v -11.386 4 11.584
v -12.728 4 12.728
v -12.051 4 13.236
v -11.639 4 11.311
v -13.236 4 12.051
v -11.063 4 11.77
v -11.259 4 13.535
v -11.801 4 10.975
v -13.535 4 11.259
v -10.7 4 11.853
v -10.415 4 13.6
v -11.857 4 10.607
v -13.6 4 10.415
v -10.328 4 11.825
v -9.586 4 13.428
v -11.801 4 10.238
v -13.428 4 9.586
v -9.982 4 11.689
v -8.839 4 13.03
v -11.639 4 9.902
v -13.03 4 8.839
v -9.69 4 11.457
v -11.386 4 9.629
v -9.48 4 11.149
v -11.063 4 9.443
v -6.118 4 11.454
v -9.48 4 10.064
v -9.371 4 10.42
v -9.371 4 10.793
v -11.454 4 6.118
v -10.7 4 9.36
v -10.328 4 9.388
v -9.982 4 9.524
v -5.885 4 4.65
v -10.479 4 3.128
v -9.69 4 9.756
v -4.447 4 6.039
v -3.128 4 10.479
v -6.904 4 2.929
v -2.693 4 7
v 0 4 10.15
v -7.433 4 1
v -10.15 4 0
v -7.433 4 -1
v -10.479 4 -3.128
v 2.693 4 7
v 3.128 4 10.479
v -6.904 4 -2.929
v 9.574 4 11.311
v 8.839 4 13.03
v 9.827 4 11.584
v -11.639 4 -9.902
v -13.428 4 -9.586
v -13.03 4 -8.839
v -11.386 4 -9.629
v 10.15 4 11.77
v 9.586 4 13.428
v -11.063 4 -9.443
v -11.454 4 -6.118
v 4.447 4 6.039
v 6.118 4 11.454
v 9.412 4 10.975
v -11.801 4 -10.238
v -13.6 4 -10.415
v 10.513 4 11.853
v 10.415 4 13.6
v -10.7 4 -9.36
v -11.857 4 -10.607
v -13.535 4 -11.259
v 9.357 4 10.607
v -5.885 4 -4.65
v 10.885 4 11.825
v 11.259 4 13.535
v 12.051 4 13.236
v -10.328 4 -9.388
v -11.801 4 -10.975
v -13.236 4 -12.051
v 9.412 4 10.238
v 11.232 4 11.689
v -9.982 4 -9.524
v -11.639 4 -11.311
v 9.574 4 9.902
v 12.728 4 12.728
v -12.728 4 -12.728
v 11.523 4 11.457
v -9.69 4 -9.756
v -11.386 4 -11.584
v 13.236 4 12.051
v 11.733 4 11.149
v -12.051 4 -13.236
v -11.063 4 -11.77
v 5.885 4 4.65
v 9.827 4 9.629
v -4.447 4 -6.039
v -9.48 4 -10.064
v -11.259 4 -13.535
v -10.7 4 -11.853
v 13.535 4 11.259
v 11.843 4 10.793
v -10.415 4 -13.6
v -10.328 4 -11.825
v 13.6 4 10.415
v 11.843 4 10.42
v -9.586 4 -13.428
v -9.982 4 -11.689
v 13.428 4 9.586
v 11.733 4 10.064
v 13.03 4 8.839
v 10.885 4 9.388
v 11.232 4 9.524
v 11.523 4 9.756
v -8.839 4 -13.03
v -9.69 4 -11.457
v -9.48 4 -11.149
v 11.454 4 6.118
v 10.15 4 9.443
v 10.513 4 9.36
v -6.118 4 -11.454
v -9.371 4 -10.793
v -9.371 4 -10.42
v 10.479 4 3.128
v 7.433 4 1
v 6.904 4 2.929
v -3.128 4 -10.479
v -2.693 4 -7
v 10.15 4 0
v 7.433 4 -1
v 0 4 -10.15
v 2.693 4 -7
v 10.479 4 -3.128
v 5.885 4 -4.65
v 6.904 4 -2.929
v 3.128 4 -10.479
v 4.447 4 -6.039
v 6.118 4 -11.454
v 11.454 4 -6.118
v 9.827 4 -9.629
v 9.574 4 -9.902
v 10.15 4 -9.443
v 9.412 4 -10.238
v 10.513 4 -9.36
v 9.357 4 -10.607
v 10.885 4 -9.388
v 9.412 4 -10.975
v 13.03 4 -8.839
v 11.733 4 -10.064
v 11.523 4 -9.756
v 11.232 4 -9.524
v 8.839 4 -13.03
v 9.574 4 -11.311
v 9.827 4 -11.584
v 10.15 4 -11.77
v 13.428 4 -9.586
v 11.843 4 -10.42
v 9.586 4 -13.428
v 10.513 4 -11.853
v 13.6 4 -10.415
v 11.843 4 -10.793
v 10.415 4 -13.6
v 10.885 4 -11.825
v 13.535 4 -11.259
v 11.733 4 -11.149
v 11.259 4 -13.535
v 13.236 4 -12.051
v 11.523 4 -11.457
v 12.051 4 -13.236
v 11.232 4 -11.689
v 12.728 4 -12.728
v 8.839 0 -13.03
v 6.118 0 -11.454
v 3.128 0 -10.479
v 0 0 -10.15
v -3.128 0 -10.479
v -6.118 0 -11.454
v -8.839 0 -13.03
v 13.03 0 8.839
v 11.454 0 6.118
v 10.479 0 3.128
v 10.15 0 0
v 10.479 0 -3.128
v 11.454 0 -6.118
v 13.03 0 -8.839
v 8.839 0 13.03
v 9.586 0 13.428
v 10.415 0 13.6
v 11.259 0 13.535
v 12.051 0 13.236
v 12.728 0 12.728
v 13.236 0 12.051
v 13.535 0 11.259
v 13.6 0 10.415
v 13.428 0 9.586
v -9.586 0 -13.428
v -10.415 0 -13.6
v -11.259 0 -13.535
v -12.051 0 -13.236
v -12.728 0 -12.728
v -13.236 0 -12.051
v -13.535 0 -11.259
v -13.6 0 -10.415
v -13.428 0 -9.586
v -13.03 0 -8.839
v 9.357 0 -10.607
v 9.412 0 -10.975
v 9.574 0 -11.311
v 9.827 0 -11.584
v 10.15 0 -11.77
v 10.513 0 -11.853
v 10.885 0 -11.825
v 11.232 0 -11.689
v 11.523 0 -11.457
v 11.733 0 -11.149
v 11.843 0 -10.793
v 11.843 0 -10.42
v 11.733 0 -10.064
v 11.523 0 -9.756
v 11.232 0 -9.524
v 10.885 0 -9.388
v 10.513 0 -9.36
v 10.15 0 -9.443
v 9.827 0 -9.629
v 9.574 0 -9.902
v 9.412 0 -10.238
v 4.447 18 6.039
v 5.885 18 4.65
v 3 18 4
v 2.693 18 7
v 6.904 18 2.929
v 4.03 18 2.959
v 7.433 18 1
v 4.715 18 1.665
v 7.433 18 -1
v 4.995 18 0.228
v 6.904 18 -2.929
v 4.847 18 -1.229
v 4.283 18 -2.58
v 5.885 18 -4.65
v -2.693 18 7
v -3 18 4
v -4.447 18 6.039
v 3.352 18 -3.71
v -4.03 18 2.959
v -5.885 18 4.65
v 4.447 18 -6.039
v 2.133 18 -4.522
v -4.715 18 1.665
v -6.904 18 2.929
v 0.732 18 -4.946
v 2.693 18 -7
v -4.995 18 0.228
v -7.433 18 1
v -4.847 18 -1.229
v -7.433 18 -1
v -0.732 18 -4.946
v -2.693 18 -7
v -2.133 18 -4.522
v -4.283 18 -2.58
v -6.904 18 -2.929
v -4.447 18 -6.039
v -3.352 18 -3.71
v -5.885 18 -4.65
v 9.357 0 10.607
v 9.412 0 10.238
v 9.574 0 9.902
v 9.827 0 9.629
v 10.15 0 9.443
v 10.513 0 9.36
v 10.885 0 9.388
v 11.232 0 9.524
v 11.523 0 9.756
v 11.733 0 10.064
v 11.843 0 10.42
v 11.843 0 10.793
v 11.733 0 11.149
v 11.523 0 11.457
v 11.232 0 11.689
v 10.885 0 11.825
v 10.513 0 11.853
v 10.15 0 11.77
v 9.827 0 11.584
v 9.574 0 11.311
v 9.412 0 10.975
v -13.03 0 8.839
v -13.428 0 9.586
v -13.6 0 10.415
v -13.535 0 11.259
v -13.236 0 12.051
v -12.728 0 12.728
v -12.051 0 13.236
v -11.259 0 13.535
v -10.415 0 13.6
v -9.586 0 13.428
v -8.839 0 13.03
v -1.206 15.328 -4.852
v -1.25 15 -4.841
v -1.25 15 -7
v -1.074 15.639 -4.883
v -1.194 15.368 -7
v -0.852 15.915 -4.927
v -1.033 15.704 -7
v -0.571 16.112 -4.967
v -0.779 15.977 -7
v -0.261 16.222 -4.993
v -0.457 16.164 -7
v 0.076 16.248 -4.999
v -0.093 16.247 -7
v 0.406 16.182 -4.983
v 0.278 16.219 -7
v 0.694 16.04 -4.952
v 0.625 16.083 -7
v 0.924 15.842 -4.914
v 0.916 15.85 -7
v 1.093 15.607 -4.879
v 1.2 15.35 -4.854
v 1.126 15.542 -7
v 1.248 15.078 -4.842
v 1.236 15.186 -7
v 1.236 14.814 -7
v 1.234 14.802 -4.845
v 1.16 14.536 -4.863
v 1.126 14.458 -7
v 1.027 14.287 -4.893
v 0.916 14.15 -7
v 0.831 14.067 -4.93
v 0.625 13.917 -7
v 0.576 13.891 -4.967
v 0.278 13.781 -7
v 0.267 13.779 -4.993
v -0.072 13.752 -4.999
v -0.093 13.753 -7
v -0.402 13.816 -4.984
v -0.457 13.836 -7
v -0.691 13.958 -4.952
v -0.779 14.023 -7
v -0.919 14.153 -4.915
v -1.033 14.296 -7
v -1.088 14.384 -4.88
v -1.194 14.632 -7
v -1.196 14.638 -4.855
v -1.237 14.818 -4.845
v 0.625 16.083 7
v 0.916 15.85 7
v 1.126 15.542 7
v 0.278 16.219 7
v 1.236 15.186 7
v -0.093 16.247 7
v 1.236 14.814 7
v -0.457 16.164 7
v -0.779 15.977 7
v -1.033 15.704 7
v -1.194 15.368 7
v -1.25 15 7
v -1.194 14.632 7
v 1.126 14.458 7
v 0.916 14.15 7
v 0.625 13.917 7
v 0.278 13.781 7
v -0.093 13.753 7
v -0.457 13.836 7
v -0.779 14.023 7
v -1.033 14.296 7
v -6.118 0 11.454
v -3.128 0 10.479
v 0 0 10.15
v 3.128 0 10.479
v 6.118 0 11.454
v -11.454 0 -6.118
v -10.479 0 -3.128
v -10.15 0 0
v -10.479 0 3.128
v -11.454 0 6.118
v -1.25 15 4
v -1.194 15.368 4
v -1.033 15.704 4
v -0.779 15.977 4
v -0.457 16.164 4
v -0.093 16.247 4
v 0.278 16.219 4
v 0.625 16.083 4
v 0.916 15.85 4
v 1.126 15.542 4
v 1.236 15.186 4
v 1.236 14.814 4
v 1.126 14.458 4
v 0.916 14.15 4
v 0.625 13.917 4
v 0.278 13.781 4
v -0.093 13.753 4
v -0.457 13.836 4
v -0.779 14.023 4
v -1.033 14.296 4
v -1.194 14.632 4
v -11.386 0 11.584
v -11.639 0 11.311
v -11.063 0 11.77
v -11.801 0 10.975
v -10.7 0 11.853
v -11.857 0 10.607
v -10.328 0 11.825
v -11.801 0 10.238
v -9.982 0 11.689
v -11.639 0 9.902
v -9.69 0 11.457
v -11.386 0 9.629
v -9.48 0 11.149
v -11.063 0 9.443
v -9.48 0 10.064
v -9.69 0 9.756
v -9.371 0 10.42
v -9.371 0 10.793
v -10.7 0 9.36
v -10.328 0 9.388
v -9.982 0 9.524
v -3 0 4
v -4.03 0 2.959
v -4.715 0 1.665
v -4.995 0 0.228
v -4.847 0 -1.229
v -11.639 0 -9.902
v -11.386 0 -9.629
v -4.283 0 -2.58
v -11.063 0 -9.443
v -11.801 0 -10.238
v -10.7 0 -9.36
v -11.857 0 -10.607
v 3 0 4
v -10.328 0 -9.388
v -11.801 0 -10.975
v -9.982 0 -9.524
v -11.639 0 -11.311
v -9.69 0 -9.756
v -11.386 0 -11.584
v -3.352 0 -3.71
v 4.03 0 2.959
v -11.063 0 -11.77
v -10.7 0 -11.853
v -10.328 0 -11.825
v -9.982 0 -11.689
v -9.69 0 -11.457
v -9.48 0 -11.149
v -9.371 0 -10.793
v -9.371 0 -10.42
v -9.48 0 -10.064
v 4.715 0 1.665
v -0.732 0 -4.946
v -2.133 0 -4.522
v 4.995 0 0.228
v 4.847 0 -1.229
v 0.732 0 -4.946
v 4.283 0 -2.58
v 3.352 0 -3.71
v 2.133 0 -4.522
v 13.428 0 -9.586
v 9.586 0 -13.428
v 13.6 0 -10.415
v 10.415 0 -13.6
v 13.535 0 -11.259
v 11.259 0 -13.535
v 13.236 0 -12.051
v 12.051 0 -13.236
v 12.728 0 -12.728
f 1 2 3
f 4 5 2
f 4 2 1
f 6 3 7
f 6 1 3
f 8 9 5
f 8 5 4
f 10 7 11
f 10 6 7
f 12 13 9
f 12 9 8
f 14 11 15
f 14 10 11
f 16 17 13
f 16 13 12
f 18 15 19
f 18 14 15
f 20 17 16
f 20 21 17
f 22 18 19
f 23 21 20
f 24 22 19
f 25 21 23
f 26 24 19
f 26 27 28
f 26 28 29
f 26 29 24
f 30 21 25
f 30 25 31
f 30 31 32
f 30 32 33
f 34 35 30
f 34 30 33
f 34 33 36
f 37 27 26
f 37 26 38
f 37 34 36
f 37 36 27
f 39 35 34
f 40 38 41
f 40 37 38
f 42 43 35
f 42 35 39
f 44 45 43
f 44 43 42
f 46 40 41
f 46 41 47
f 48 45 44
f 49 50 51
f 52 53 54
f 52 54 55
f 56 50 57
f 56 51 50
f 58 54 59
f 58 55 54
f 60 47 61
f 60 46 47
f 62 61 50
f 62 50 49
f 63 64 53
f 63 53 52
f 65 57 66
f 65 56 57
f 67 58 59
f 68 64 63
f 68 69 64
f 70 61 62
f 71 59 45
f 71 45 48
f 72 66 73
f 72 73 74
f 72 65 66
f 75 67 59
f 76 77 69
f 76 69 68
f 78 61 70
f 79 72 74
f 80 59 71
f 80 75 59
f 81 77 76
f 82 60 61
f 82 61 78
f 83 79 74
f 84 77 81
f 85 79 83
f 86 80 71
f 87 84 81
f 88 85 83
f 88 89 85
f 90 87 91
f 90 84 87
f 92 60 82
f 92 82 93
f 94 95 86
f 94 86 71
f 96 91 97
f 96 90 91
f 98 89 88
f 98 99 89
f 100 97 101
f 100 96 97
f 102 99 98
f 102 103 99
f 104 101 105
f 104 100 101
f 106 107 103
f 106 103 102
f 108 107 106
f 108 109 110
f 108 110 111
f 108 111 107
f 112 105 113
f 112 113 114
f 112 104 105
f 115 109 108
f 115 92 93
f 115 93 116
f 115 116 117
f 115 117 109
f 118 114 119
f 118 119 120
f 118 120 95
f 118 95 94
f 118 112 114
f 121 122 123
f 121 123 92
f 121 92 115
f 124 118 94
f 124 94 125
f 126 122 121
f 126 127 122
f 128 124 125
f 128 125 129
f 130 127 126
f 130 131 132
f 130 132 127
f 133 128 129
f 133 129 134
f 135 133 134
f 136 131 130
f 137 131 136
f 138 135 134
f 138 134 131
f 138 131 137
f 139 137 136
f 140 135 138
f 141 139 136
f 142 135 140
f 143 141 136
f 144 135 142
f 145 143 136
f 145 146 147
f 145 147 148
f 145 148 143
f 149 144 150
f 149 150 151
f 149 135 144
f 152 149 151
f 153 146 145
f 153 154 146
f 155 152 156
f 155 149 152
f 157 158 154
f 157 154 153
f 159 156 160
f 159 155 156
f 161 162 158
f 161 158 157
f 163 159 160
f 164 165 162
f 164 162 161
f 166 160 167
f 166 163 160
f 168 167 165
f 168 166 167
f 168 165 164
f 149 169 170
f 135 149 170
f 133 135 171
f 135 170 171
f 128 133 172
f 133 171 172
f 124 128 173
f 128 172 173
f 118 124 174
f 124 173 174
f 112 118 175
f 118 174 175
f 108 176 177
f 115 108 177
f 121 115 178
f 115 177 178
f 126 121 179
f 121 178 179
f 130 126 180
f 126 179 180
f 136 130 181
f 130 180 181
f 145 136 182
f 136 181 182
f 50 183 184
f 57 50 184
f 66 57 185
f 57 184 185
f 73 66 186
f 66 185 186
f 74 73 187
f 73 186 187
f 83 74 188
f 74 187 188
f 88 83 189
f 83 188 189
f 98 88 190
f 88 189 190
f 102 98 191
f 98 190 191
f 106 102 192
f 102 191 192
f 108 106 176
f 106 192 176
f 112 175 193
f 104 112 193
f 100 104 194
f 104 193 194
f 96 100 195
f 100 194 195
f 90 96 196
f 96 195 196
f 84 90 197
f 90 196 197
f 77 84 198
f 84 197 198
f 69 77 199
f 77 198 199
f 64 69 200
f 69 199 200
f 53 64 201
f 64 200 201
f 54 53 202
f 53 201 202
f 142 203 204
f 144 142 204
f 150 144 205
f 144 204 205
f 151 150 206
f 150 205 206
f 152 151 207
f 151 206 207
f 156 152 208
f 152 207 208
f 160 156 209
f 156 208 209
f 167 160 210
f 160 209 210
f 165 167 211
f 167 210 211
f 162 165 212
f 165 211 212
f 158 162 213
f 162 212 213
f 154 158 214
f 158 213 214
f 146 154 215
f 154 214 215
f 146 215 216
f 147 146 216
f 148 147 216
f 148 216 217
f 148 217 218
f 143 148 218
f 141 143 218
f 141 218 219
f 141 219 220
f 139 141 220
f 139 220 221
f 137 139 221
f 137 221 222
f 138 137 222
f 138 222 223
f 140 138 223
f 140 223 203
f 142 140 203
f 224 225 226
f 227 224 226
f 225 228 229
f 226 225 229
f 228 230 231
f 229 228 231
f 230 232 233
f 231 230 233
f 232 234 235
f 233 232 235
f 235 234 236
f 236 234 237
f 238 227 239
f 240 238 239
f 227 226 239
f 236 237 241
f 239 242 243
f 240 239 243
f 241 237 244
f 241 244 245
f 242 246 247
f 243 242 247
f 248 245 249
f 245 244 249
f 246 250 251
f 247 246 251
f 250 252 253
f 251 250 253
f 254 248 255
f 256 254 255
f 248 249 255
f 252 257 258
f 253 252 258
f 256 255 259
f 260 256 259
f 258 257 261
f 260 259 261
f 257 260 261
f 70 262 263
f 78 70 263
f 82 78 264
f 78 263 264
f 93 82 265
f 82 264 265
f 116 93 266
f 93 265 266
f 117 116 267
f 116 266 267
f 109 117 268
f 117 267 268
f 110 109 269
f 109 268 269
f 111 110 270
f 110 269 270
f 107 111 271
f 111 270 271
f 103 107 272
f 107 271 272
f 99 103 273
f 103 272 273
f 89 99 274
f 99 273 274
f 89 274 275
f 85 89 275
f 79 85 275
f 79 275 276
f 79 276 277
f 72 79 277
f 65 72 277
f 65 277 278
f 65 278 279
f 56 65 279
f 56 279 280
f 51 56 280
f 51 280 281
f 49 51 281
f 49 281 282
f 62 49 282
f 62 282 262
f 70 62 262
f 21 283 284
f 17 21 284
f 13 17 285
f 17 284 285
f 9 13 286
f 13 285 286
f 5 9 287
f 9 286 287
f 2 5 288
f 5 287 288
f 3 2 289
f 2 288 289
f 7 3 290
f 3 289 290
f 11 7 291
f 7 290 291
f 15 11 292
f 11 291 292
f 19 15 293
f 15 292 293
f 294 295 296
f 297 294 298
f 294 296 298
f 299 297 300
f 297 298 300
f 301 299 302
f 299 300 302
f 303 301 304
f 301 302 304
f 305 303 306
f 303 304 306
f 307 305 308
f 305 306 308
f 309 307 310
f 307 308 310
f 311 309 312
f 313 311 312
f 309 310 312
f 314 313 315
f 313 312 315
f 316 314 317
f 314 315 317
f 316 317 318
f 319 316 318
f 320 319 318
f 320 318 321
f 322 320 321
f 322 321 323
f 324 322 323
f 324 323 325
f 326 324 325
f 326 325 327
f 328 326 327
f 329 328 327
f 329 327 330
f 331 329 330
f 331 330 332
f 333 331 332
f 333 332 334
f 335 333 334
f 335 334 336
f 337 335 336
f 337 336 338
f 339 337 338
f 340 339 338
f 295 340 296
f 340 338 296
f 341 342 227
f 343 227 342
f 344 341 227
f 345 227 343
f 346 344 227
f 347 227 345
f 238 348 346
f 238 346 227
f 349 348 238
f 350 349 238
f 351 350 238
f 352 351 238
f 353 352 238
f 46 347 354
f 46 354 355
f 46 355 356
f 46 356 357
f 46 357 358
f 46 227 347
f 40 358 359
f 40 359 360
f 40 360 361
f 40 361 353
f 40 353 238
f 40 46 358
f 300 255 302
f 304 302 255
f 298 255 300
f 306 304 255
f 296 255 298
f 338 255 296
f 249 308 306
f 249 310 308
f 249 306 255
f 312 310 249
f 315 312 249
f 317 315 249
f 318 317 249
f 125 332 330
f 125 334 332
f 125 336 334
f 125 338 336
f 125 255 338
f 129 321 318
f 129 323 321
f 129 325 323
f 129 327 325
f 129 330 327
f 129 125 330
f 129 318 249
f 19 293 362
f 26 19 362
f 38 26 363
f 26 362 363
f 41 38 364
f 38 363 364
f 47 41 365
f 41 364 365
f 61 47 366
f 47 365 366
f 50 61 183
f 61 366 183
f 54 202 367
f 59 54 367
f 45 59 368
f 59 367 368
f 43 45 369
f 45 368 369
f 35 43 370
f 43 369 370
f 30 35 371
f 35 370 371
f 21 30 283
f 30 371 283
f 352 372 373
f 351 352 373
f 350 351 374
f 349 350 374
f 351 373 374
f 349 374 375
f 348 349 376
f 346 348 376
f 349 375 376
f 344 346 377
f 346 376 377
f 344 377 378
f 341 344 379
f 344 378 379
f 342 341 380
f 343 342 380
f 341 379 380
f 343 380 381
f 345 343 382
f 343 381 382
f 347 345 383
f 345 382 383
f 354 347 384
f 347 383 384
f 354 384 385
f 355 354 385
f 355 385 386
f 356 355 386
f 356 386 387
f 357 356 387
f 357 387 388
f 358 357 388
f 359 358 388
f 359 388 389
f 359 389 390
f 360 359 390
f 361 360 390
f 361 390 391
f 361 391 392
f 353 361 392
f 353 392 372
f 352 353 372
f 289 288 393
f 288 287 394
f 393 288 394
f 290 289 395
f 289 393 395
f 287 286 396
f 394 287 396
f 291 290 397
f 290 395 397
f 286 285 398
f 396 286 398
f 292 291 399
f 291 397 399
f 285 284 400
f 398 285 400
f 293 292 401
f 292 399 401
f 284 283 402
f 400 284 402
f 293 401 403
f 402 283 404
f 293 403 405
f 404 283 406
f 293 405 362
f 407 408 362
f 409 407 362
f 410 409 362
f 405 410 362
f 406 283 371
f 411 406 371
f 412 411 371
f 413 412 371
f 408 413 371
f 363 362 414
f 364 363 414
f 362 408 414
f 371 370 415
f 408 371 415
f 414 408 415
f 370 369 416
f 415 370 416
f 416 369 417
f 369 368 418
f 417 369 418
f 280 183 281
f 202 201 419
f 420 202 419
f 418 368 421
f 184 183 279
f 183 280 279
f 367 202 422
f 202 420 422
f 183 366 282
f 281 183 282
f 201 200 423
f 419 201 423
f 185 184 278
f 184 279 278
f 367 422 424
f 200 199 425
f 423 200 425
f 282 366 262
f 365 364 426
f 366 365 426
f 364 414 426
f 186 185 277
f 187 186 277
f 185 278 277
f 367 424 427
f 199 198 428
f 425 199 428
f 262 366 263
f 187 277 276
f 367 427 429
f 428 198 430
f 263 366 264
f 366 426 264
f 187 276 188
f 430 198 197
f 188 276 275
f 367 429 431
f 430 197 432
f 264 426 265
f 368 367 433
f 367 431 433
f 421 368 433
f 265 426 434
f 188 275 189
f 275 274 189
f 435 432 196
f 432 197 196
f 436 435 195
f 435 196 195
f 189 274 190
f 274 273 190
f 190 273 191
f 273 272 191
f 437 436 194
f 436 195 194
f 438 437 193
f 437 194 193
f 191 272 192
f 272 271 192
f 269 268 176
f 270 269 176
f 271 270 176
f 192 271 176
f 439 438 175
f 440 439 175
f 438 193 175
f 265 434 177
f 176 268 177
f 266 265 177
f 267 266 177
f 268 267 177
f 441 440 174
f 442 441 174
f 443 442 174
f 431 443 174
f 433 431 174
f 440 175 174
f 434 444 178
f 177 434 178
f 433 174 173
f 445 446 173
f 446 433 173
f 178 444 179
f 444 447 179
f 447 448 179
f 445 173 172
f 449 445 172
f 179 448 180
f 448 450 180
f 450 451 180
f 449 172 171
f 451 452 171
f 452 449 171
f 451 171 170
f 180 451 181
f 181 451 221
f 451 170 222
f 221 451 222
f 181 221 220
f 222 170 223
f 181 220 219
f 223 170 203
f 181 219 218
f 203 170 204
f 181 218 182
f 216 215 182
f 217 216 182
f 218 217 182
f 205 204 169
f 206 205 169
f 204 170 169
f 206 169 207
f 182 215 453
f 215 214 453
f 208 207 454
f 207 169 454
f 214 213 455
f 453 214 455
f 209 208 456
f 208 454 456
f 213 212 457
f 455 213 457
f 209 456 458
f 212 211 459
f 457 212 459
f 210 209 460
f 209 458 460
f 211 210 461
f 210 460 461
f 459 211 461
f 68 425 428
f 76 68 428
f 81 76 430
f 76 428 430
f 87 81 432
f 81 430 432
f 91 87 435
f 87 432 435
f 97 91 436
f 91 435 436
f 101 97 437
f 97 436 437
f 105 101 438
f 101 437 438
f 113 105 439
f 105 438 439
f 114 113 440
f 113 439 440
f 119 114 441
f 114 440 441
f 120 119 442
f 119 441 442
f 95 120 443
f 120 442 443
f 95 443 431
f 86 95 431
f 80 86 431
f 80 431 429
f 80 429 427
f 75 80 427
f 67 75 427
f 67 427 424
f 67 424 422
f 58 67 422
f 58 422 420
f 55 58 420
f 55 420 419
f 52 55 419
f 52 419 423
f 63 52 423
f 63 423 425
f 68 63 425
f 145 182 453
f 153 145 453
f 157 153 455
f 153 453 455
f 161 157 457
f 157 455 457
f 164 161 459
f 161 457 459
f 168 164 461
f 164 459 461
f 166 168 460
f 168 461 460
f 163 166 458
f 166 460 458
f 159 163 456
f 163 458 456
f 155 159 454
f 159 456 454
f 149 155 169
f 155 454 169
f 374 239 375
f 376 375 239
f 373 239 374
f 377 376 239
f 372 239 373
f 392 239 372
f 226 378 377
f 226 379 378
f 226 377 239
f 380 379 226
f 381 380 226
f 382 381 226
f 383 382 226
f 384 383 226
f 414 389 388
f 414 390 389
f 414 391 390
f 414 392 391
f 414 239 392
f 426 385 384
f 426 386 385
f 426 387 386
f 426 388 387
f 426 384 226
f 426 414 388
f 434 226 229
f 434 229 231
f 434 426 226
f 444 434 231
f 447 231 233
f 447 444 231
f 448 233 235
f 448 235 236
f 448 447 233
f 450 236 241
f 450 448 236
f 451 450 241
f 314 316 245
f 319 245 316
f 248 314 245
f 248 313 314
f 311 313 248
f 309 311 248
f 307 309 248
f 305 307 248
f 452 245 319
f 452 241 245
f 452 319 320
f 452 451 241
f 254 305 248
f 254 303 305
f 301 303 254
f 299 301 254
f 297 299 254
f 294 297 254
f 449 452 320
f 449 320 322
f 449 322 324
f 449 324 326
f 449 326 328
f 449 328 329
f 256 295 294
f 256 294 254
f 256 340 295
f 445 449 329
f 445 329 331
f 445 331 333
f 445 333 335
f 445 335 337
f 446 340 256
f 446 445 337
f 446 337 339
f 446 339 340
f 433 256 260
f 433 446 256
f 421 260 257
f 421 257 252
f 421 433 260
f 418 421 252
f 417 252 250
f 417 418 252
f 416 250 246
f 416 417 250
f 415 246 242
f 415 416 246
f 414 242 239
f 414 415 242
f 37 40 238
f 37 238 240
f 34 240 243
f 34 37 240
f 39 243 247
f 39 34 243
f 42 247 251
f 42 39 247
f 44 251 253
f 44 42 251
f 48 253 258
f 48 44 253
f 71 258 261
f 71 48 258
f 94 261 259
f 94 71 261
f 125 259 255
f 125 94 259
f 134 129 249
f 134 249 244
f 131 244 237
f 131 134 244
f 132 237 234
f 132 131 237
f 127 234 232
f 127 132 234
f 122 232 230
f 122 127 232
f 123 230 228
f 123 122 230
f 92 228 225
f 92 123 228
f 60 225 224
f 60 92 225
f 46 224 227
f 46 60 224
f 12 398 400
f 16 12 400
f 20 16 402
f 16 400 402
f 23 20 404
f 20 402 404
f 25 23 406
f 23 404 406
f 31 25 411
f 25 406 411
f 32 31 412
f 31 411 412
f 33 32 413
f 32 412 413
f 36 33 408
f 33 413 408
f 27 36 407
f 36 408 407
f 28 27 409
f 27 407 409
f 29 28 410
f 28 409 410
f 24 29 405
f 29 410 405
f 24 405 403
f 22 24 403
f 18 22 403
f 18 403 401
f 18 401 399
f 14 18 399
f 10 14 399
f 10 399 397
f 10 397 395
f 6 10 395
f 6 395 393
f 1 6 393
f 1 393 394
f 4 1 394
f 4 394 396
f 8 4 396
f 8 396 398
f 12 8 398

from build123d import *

# Parameters (mm, degrees)
EXTRUDE_1_DEPTH    = 4
EXTRUDE_2_DEPTH    = 14
HOLE_WIZARD_M3_1_D = 2.5
HOLE_WIZARD_M3_2_D = 2.5


with BuildPart() as part:
    # 草图1 → 凸台-拉伸1 (new body)
    with BuildSketch(Plane(origin=(0, 0, 0), x_dir=(1, 0, 0), z_dir=(0, 1, 0))):
        with BuildLine():
            ThreePointArc((-8.838834765, 13.030441647), (-12.727922061, 12.727922061), (-13.030441647, 8.838834765))
            ThreePointArc((-13.030441647, 8.838834765), (-10.14964129, 0), (-13.030441647, -8.838834765))
            ThreePointArc((-13.030441647, -8.838834765), (-12.727922061, -12.727922061), (-8.838834765, -13.030441647))
            ThreePointArc((-8.838834765, -13.030441647), (0, -10.14964129), (8.838834765, -13.030441647))
            ThreePointArc((8.838834765, -13.030441647), (12.727922061, -12.727922061), (13.030441647, -8.838834765))
            ThreePointArc((13.030441647, -8.838834765), (10.14964129, 0), (13.030441647, 8.838834765))
            ThreePointArc((13.030441647, 8.838834765), (12.727922061, 12.727922061), (8.838834765, 13.030441647))
            ThreePointArc((8.838834765, 13.030441647), (0, 10.14964129), (-8.838834765, 13.030441647))
        make_face()
        with BuildLine():
            Line((-3, -4), (3, -4))
            ThreePointArc((3, -4), (0, 5), (-3, -4))
        make_face(mode=Mode.SUBTRACT)
    extrude(amount=EXTRUDE_1_DEPTH)

    # 草图2 → 凸台-拉伸2 (add)
    with BuildSketch(Plane(origin=(0, 4, 0), x_dir=(1, 0, 0), z_dir=(0, 1, 0))):
        with BuildLine():
            Line((-2.692582404, 7), (2.692582404, 7))
            ThreePointArc((2.692582404, 7), (7.5, 0), (2.692582404, -7))
            Line((2.692582404, -7), (-2.692582404, -7))
            ThreePointArc((-2.692582404, -7), (-7.5, 0), (-2.692582404, 7))
        make_face()
        with BuildLine():
            Line((-3, -4), (3, -4))
            ThreePointArc((3, -4), (0, 5), (-3, -4))
        make_face(mode=Mode.SUBTRACT)
    extrude(amount=EXTRUDE_2_DEPTH)

    # M3 螺纹孔1 (through all)
    with Locations(Plane(origin=(0, 4, 0), x_dir=(1, 0, 0), z_dir=(0, 1, 0))):
        with Locations((-10.606601718, 10.606601718), (10.606601718, 10.606601718), (10.606601718, -10.606601718), (-10.606601718, -10.606601718)):
            Hole(HOLE_WIZARD_M3_1_D / 2)

    # M3 螺纹孔2 (through all)
    with Locations(Plane.XY.offset(7)):
        with Locations((0, 15)):
            Hole(HOLE_WIZARD_M3_2_D / 2)


solid = part.part
